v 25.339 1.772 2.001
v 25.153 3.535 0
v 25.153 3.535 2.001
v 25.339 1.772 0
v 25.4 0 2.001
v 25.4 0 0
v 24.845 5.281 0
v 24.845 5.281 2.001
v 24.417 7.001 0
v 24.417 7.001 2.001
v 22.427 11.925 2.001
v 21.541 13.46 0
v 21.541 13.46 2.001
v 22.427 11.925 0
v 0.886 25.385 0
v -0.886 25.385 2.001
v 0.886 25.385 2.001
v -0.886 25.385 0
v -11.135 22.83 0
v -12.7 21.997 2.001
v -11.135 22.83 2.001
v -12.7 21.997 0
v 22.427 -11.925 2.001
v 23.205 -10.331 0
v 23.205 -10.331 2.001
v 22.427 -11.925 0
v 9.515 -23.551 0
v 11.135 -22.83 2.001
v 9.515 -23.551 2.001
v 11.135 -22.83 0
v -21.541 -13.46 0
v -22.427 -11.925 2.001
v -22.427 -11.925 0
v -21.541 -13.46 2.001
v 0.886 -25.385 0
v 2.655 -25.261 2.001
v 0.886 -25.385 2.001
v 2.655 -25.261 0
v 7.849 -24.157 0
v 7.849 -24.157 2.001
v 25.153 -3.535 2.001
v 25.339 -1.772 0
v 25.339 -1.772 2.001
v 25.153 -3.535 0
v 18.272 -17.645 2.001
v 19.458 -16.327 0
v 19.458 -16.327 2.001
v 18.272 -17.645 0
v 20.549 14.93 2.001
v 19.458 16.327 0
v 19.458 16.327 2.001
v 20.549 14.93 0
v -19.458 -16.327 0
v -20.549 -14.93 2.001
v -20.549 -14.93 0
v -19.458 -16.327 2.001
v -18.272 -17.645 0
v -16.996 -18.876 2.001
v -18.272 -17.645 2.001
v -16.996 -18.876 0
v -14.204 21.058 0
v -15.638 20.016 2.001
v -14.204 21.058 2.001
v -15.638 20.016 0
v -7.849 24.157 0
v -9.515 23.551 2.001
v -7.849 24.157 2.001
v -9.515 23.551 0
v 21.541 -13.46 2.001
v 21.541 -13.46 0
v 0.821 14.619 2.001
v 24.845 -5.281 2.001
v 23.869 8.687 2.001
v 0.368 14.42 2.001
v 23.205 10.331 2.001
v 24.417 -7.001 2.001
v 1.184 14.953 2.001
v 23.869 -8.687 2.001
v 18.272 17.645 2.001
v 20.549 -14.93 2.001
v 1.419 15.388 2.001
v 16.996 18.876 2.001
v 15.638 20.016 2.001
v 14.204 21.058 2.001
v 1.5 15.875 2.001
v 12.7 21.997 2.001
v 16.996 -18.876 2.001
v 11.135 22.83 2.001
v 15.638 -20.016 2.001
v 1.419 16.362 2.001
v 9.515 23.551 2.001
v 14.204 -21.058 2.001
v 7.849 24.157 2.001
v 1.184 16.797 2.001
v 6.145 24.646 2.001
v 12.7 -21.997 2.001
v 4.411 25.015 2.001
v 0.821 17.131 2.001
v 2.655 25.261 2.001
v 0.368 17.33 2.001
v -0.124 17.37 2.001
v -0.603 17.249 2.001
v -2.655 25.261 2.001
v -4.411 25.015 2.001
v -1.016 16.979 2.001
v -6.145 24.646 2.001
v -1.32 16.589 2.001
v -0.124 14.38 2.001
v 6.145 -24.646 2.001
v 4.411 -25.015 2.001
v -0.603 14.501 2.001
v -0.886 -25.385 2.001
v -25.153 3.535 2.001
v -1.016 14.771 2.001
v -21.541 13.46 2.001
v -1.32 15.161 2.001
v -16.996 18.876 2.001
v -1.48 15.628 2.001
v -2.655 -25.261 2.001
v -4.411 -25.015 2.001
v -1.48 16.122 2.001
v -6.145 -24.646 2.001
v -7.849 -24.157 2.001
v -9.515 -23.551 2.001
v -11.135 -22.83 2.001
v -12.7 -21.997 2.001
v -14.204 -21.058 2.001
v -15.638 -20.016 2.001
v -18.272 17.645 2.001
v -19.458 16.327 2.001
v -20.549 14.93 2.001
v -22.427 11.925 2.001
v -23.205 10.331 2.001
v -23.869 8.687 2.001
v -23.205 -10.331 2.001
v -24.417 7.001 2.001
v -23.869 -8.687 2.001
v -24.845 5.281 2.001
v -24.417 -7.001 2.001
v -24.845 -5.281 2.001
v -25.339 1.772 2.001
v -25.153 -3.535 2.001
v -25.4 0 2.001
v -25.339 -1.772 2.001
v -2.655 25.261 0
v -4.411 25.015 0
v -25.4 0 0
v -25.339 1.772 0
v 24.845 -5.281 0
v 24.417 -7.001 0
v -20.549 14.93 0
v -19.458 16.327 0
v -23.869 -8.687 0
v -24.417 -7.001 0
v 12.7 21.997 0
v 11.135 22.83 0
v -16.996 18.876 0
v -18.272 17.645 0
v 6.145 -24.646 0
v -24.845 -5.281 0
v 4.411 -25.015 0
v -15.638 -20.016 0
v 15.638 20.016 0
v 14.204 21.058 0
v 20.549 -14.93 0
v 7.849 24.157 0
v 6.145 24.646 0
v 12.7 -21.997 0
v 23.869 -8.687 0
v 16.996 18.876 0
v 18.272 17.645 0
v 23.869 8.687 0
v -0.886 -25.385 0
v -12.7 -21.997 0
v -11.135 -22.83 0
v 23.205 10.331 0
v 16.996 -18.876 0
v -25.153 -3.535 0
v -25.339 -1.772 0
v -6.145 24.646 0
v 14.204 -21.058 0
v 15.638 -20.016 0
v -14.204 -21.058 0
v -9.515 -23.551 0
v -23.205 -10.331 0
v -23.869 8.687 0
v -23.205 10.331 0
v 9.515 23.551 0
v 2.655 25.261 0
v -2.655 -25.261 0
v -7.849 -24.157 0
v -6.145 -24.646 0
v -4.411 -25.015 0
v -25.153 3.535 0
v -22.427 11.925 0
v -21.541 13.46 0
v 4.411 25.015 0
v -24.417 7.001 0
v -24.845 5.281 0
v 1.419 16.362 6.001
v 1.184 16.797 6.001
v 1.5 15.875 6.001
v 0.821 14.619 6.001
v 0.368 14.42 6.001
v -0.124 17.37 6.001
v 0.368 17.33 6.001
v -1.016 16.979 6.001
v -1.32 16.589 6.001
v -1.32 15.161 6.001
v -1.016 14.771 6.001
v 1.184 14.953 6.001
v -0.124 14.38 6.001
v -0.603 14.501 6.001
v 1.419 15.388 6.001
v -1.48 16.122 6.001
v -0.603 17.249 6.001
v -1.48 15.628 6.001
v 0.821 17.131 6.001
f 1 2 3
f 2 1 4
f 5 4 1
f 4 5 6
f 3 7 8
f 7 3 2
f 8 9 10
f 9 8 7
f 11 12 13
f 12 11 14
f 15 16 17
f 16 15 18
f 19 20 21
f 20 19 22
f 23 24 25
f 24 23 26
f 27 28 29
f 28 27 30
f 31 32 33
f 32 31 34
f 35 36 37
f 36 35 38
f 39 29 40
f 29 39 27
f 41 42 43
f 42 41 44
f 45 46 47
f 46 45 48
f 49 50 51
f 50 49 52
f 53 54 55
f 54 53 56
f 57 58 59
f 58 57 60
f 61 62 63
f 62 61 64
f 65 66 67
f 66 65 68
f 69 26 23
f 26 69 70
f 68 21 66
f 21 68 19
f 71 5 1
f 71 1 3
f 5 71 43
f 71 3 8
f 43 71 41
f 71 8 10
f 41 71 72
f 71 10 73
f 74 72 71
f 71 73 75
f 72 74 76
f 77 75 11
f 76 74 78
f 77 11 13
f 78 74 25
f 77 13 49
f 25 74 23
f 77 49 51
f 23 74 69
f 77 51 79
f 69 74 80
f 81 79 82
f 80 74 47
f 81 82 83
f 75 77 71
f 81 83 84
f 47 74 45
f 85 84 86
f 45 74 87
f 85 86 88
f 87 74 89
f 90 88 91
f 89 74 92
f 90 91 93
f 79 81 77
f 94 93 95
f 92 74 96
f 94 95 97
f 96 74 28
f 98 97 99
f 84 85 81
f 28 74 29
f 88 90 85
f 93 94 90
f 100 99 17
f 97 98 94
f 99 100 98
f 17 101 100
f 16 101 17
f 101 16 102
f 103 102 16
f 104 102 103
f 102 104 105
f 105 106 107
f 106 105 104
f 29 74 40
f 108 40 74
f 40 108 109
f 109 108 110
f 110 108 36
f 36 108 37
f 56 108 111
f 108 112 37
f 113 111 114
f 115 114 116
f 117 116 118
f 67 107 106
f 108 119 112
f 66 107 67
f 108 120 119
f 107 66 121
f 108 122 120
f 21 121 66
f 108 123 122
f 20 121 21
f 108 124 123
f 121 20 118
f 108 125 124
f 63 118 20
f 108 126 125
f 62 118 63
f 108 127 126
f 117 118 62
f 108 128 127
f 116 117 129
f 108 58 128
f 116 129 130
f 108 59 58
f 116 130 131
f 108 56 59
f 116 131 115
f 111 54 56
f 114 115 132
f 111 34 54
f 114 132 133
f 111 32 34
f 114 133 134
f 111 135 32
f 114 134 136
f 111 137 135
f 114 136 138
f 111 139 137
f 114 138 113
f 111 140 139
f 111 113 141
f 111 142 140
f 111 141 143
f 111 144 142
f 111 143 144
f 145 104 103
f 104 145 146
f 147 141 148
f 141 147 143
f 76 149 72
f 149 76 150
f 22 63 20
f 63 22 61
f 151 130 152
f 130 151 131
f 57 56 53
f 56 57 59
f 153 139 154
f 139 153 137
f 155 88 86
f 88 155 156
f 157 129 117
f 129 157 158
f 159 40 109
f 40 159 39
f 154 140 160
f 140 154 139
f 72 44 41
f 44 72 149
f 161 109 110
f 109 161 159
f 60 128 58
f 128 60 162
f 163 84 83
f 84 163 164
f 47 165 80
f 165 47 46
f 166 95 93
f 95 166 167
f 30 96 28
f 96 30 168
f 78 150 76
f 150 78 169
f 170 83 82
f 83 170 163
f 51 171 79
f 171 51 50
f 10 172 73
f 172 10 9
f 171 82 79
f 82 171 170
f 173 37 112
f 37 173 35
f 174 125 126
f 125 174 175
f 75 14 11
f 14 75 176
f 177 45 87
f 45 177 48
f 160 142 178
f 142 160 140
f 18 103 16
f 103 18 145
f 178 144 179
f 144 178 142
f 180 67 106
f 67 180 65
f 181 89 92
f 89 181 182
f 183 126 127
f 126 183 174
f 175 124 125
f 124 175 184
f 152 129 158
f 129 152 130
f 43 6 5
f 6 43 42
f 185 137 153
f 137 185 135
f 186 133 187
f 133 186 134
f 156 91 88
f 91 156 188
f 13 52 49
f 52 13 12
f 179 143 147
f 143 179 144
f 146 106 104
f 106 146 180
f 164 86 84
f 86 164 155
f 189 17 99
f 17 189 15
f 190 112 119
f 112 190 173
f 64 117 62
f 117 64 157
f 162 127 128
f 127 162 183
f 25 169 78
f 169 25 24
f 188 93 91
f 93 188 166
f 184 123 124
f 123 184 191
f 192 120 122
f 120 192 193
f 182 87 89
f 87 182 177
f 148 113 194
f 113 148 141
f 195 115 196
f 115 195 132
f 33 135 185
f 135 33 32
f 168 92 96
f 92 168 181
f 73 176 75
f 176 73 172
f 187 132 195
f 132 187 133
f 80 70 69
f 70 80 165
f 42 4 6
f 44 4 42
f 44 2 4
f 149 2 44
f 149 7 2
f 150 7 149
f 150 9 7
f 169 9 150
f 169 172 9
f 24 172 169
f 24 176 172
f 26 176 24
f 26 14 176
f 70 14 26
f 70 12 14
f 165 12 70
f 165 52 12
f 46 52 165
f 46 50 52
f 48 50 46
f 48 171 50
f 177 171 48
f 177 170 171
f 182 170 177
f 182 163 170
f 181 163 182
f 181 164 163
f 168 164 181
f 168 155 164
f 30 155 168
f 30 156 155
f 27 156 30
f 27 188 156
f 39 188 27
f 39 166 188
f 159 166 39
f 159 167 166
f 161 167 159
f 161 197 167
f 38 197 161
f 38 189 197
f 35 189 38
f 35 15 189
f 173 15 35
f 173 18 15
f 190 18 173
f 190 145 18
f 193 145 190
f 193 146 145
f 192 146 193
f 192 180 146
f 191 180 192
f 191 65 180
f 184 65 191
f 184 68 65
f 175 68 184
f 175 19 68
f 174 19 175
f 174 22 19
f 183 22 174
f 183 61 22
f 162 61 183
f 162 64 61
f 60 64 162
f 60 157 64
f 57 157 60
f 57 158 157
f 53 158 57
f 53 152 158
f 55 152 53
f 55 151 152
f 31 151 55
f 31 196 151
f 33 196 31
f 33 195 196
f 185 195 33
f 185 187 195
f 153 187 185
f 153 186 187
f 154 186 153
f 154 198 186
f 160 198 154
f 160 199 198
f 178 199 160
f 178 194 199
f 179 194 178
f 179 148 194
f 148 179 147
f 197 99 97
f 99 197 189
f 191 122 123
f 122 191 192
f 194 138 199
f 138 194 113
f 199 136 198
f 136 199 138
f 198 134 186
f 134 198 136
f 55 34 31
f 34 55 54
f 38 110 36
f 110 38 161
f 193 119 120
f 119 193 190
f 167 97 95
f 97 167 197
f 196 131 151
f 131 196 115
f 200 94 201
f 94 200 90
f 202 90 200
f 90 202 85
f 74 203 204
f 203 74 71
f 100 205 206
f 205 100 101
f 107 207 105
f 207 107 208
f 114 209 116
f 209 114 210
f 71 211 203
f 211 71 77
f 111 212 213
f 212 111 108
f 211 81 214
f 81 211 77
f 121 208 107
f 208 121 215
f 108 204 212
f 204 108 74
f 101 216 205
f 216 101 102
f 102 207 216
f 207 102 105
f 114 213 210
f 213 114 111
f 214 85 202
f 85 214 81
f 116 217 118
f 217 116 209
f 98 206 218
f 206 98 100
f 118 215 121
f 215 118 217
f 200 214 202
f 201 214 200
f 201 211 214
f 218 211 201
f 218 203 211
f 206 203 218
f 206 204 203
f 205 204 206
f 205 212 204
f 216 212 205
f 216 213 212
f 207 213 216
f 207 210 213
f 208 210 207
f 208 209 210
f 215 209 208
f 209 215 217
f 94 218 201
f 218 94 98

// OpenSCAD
//Customizer Variables

// Specify the shape of the base
base_shape = 90;//[90:round,3:triangle,4:square,5:pentagon,6:hexagon,7:heptagon,8:octagon,10:decagon,12:dodecagon]

// Most display stands appear to be around 2 to 3.175 mm in height
base_height = 2;
base_diameter = 50.8;

// This section displays the peg measurement options

peg_height = 4;
peg_diameter = 3;

// This section displays the peg position.  Note the z offset is not customizable.  The peg_height should account for a z position of 0 and add the hight of the base to the size of the peg.  
// Default is a 6mm peg + base height

// If both X & Y offset are 0 peg will be centered
peg_x_offset = 0;
peg_y_offset = 15.875;

/* [Hidden] */
// Add a tolerance level of 0.001 mm to prevent zero sized prints
// This is small enough that it should not be noticeable to any printers

tolerance = 0.001;

// Create the base

if(base_shape == 3)
{   
    //Triangle base
    
    rotate([0,0,90]) cylinder(h=base_height+tolerance, d=base_diameter+tolerance, $fa=1, $fn=base_shape);
}

else 
{
    //All other shapes
    
    cylinder(h=base_height+tolerance, d=base_diameter+tolerance, $fa=1, $fn=base_shape);
}


//create the peg

translate([peg_x_offset, peg_y_offset, 0])
   cylinder(h=peg_height+tolerance+base_height, d=peg_diameter+tolerance, $fa=1, $fs=0.5);

